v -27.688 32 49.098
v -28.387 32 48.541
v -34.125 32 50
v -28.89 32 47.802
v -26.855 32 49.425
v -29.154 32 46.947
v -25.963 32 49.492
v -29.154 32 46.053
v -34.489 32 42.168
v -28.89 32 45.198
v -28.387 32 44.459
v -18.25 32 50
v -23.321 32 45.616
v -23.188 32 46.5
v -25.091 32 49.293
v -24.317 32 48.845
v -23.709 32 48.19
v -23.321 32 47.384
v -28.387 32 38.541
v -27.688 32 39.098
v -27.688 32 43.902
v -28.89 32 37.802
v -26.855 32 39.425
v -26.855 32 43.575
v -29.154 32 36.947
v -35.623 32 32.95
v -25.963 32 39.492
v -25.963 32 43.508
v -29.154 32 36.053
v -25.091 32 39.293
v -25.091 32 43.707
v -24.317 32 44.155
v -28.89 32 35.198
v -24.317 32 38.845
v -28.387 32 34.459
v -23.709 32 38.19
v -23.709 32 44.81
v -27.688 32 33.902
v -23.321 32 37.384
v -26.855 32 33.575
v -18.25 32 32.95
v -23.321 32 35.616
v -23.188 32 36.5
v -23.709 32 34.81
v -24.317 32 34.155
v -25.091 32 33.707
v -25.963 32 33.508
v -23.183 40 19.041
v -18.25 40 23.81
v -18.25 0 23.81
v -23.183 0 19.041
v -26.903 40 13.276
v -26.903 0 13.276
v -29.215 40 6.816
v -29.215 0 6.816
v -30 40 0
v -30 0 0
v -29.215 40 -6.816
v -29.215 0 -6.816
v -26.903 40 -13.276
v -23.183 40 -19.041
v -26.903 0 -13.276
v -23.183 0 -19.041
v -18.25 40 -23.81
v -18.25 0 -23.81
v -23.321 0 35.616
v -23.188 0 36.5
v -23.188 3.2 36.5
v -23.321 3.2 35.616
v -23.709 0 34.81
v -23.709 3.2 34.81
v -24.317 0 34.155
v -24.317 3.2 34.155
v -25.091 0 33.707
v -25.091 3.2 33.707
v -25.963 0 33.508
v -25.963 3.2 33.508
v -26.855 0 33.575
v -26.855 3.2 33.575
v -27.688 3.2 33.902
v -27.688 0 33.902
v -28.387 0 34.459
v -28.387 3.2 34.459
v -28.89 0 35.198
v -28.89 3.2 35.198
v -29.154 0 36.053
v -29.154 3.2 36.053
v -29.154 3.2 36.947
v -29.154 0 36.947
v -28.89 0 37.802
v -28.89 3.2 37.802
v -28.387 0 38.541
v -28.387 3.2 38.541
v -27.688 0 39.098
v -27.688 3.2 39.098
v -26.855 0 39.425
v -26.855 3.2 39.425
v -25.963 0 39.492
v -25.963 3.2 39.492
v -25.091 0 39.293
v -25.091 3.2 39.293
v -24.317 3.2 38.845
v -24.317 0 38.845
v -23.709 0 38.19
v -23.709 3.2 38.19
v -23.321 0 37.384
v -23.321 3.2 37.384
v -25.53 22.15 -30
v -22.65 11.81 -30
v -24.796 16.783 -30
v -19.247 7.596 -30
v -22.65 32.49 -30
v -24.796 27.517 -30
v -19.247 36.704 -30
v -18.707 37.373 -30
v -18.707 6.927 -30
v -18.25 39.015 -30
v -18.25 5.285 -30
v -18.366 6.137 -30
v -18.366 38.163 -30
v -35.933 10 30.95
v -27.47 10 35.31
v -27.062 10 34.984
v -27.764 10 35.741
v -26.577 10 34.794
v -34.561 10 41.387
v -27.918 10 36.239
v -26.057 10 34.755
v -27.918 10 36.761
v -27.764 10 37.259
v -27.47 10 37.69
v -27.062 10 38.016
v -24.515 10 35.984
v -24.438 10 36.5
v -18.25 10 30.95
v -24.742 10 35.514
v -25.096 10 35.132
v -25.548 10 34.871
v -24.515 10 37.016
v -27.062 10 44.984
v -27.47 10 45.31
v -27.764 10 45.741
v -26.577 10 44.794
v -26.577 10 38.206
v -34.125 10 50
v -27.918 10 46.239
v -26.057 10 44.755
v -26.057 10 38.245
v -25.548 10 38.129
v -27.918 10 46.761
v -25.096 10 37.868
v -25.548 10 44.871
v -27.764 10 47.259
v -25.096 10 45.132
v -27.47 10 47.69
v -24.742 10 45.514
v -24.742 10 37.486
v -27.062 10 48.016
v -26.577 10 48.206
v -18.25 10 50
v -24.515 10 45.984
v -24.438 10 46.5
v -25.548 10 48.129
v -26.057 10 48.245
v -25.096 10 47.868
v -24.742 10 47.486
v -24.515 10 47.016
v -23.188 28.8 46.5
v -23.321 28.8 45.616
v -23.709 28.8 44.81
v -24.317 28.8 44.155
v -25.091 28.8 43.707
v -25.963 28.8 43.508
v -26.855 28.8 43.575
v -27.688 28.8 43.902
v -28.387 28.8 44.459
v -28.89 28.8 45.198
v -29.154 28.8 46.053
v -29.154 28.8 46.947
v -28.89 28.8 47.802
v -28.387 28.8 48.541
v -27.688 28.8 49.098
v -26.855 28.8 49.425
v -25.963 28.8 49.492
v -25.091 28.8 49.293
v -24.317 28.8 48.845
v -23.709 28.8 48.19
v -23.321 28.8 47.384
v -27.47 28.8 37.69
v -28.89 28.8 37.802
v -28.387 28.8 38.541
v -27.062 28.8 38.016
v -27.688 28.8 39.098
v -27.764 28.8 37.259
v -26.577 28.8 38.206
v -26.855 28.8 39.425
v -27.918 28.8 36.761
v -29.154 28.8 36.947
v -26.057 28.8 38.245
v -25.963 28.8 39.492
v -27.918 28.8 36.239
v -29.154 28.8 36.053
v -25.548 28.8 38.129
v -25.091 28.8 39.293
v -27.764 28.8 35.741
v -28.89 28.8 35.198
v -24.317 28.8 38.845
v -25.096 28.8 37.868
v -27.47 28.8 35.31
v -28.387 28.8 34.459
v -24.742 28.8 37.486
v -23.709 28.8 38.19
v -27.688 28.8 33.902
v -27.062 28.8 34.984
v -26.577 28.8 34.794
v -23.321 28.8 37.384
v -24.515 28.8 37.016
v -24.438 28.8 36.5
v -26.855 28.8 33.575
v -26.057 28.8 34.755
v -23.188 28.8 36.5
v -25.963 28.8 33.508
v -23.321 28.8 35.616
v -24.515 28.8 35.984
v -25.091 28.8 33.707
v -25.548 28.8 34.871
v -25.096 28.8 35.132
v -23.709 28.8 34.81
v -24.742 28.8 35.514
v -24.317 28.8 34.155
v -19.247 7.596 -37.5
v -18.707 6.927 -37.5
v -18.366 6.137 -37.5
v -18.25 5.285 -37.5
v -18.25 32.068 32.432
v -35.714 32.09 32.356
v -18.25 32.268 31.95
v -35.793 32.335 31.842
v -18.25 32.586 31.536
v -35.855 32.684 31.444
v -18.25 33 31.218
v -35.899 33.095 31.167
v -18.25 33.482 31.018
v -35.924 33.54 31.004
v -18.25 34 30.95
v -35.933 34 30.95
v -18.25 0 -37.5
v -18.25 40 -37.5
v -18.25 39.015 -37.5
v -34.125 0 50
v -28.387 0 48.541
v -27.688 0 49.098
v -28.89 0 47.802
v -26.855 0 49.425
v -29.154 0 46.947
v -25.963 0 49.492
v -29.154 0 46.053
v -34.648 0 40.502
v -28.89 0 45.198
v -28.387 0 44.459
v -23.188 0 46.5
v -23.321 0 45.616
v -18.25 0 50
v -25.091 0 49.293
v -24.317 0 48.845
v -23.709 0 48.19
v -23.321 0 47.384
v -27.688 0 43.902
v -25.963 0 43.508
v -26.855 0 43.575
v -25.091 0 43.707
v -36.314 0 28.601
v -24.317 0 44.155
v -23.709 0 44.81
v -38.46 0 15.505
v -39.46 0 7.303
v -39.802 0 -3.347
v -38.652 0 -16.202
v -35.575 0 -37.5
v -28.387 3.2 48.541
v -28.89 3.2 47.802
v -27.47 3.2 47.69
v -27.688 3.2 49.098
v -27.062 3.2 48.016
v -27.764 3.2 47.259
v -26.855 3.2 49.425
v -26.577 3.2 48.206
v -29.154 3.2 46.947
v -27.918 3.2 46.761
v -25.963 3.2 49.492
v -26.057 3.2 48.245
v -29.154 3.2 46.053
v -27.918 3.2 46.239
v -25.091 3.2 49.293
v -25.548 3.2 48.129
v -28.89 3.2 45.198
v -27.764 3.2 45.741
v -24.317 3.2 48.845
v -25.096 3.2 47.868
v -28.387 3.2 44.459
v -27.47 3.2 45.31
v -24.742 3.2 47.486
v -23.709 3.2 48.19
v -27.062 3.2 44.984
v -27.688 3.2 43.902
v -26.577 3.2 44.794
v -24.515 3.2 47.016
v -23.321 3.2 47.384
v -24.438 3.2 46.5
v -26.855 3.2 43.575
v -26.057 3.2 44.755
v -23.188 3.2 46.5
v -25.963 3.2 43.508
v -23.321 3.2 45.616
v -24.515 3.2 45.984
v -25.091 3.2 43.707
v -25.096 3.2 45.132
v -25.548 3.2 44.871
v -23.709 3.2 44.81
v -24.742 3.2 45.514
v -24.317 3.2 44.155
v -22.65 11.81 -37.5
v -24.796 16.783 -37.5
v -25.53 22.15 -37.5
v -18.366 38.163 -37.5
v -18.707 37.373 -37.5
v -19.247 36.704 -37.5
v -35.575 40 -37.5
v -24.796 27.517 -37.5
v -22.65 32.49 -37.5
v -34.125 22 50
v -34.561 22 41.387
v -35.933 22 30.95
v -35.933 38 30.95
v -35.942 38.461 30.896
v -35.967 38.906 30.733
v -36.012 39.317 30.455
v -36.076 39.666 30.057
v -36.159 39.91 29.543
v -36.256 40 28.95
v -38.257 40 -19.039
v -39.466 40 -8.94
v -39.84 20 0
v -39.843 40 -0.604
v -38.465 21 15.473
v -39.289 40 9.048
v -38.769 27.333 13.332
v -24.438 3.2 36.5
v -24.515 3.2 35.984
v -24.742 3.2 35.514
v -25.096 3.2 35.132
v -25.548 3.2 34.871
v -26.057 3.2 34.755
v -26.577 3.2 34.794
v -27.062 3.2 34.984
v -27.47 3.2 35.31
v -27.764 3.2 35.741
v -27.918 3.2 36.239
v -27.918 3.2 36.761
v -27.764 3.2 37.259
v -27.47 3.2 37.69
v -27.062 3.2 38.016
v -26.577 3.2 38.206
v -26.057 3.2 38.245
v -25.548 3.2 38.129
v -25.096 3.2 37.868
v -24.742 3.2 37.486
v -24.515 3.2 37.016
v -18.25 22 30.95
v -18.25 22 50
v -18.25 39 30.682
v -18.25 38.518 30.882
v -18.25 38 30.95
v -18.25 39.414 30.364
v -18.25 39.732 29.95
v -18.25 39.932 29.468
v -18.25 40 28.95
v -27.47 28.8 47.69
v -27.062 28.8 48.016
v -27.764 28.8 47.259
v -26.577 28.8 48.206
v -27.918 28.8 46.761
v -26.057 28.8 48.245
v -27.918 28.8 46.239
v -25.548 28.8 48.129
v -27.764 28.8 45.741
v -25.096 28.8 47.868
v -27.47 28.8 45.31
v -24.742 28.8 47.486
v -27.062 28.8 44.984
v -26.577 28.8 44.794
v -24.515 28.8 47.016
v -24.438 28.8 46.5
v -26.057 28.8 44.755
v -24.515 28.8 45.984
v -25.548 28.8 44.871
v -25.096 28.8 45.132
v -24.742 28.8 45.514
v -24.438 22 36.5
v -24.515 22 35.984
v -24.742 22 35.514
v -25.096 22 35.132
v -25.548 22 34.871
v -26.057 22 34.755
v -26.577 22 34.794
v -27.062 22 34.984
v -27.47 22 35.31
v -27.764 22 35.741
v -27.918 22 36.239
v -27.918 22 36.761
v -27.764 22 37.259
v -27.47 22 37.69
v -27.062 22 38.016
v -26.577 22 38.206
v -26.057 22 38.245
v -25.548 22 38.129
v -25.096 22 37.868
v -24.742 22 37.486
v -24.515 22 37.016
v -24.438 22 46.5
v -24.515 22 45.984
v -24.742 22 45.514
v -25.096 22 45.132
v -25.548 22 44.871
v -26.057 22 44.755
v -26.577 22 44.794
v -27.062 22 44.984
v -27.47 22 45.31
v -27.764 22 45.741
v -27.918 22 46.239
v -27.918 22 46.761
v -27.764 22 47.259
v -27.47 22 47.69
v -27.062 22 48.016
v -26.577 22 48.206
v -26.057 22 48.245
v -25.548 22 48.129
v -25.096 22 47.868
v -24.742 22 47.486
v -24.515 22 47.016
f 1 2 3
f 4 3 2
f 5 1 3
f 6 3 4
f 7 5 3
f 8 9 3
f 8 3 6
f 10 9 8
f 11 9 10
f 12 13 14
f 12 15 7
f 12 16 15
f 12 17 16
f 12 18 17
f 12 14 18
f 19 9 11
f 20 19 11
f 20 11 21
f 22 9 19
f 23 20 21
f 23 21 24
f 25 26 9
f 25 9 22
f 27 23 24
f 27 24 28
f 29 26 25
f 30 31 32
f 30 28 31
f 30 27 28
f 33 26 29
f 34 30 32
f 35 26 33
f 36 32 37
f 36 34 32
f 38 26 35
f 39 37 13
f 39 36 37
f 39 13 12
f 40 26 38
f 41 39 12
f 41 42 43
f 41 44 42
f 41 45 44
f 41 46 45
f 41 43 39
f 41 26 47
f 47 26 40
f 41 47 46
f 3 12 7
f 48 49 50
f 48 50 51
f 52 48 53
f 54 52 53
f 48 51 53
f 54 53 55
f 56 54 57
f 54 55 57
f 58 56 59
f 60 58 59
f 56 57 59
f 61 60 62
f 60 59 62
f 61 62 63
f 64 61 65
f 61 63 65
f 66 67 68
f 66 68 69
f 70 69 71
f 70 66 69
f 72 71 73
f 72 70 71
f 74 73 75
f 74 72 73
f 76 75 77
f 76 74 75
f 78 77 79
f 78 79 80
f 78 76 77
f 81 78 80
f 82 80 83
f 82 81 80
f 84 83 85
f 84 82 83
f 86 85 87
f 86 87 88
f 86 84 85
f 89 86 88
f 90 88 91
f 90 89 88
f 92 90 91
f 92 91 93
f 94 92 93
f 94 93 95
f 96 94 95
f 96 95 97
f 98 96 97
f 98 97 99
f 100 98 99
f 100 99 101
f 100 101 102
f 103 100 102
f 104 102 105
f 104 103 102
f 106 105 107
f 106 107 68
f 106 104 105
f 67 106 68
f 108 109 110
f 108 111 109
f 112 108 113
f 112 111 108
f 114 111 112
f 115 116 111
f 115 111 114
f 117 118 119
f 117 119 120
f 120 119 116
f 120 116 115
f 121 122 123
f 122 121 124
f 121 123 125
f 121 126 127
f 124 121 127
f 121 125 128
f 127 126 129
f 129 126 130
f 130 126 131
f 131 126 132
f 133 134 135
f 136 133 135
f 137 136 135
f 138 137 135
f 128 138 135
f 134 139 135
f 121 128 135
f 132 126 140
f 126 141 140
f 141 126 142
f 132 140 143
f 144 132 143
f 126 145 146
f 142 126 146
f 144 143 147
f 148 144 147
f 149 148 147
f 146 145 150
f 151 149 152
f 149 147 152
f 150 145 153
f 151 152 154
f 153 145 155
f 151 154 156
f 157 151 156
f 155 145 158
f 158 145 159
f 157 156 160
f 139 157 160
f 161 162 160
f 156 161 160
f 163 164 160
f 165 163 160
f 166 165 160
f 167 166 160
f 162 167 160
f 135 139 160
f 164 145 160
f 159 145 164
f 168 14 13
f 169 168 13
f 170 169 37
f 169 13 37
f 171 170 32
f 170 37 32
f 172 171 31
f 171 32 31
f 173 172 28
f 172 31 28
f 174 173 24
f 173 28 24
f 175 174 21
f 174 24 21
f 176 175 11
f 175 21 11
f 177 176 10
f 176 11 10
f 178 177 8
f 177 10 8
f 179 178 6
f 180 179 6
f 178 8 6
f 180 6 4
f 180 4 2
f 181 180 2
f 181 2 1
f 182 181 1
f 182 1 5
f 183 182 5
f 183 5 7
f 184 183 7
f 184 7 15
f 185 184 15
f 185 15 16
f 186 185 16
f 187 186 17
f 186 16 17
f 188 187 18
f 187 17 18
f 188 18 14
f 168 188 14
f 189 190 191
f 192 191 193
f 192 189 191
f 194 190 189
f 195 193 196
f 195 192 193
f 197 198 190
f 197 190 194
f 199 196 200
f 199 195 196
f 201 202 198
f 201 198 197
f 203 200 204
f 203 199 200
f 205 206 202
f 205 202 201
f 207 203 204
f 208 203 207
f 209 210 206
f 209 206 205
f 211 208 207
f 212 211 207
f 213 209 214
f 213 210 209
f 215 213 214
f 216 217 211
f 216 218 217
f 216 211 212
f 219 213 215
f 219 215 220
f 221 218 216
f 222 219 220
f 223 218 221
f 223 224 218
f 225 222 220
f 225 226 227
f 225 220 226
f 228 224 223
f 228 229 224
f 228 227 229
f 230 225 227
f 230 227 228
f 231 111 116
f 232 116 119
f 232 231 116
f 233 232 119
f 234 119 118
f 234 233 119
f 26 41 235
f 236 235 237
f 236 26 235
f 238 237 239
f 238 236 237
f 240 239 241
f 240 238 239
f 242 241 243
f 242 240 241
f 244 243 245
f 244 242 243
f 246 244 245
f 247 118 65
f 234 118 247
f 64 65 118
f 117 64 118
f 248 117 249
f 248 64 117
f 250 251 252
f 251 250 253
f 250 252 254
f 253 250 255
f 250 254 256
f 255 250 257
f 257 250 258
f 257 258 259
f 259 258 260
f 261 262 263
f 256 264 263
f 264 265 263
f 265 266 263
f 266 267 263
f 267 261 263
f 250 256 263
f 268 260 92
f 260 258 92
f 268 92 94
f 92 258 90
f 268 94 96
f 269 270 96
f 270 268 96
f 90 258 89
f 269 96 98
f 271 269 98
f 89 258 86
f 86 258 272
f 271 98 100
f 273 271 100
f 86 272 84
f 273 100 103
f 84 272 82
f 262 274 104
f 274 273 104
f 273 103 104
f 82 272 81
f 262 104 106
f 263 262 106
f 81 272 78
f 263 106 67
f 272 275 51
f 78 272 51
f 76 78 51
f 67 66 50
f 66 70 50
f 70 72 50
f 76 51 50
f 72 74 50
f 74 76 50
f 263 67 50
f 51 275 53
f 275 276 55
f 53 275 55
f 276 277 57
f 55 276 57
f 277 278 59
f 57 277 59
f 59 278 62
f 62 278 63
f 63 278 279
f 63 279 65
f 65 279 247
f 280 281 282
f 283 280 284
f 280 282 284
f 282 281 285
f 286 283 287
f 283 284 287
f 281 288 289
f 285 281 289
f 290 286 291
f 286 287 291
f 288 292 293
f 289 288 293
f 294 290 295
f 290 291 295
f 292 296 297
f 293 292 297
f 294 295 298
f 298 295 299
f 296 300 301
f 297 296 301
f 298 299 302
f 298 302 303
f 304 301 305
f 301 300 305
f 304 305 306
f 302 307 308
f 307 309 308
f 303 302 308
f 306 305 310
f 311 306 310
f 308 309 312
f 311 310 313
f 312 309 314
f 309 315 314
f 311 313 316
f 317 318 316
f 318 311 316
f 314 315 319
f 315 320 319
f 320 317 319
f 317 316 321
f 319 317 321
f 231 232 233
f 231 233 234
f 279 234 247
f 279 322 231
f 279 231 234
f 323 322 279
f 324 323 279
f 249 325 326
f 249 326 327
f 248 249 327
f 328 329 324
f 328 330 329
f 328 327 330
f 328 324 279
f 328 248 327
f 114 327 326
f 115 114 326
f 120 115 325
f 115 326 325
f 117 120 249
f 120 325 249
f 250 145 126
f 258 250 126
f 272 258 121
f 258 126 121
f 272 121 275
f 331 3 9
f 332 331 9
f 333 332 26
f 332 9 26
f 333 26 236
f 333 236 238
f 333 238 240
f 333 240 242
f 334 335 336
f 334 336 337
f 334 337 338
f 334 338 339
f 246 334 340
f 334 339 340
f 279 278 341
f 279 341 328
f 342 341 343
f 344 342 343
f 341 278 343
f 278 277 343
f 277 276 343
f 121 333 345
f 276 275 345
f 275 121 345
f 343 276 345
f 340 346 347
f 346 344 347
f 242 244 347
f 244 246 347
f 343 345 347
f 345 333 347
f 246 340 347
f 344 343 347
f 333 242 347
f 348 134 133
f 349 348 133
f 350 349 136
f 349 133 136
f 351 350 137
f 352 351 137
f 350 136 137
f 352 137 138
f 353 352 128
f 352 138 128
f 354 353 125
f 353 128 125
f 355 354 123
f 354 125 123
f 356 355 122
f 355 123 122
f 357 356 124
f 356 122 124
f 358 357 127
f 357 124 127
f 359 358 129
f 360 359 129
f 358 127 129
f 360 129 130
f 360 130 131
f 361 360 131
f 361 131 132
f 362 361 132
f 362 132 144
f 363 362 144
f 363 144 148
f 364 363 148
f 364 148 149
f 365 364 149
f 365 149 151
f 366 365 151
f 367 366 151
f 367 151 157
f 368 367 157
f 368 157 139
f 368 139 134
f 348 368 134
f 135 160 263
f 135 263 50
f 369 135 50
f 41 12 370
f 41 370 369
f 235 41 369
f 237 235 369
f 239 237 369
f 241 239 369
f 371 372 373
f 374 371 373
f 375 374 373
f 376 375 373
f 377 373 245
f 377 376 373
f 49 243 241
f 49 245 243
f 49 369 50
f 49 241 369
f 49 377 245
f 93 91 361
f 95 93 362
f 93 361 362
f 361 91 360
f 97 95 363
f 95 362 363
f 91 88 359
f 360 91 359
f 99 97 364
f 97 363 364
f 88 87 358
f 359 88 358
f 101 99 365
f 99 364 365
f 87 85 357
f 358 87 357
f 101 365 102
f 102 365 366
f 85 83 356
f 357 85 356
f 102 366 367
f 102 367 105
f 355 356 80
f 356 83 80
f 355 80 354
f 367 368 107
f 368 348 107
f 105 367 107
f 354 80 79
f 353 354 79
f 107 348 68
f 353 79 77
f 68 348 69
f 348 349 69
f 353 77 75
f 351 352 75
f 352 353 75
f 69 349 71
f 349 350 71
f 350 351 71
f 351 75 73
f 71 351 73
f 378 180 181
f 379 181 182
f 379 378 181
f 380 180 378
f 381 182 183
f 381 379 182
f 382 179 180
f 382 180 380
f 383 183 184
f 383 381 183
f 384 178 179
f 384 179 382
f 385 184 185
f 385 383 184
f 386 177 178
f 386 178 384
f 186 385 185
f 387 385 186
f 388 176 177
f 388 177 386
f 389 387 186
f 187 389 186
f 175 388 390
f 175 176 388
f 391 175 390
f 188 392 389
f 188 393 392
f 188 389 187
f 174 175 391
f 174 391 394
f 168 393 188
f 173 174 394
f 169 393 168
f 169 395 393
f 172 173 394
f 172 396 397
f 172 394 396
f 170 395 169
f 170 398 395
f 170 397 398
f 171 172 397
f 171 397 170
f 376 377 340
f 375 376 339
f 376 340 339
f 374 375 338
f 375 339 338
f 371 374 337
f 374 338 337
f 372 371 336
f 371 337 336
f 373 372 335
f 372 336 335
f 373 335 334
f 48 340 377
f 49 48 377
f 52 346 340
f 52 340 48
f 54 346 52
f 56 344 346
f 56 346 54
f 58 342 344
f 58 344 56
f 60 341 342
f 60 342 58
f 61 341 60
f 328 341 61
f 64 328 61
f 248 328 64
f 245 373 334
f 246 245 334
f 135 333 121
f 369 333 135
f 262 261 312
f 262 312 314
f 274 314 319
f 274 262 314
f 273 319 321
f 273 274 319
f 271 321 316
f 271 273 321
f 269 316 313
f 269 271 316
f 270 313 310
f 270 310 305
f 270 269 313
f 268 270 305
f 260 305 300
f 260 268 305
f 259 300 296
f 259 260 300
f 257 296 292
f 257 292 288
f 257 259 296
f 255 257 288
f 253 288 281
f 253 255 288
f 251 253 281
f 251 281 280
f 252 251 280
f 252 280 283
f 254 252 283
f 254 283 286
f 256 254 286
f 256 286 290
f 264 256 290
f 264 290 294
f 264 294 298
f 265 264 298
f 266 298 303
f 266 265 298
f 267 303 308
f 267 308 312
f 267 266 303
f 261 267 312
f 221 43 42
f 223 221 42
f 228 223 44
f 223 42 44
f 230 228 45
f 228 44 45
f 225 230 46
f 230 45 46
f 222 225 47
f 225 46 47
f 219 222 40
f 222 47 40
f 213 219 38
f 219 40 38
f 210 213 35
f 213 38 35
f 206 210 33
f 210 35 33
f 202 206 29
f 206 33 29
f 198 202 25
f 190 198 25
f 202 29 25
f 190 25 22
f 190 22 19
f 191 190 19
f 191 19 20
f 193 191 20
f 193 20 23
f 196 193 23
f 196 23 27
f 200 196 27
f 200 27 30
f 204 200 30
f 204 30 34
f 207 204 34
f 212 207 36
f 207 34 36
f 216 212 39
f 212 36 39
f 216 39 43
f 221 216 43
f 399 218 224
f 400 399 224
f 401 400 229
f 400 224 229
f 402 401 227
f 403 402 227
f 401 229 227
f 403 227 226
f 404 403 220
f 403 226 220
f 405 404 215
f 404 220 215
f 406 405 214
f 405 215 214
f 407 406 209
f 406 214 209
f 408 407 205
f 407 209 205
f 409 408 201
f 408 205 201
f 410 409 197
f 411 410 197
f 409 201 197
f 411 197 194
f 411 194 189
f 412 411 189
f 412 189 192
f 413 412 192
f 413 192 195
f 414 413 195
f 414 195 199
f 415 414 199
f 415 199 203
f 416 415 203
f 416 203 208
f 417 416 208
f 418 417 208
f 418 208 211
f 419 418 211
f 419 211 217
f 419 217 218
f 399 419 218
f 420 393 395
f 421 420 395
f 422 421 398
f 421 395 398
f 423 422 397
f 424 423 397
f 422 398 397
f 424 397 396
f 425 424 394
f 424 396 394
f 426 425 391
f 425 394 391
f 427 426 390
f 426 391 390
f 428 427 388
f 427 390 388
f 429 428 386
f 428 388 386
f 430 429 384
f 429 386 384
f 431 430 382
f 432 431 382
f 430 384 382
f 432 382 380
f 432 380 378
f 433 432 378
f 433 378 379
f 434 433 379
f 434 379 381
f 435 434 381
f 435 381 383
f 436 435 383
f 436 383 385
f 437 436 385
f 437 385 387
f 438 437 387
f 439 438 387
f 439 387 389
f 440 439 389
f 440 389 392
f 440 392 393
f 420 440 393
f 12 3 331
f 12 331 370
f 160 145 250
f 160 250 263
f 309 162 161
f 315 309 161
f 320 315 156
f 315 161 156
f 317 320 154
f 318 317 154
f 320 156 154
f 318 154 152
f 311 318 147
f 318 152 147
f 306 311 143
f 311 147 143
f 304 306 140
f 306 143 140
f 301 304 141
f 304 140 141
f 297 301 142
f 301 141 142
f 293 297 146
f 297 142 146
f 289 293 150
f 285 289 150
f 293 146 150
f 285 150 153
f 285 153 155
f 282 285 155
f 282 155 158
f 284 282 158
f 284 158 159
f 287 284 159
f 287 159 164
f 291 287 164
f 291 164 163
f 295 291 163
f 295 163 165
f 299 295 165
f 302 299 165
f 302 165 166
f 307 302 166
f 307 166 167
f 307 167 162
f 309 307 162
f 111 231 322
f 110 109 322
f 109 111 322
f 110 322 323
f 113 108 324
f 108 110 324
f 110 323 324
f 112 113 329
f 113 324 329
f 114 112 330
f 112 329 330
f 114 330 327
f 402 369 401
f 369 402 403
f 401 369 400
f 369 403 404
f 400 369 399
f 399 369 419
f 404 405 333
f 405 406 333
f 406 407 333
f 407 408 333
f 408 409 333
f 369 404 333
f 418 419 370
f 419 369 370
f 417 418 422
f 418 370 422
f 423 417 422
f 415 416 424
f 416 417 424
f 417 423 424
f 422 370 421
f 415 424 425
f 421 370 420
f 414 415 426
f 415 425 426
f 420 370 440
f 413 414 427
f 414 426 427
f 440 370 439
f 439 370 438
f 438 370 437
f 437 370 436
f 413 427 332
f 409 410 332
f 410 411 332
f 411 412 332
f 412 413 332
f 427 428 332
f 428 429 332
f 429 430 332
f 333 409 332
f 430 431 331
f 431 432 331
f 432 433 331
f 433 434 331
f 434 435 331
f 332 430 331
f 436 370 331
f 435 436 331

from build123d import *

# Parameters (mm, degrees)
BOSS_EXTRUDE1_DEPTH = 40
SKETCH3_W           = 12.7
SKETCH3_H           = 40
BOSS_EXTRUDE2_DEPTH = 27.178
SKETCH4_W           = 184.978795618
SKETCH4_H           = 131.733859804
CUT_EXTRUDE2_DEPTH  = 51
SKETCH5_W           = 144.166334374
SKETCH5_H           = 140.012963834
CUT_EXTRUDE3_DEPTH  = 18.25
SKETCH6_R           = 20
CUT_EXTRUDE4_DEPTH  = 20
FILLET4_R           = 3.175
SKETCH7_W           = 96.652193462
SKETCH7_H           = 93.586405028
CUT_EXTRUDE5_DEPTH  = 27.178
CUT_EXTRUDE6_DEPTH  = 41
CUT_EXTRUDE7_DEPTH  = 8
FILLET5_R           = 2
SKETCH10_R          = 1.75
CUT_EXTRUDE8_DEPTH  = 33.0000001
SKETCH11_W          = 9.551786503
SKETCH11_H          = 12
SKETCH11_W_2        = 7.9375
CUT_EXTRUDE9_DEPTH  = 19.05
SKETCH14_R          = 3
CUT_EXTRUDE10_DEPTH = 3.2
SKETCH15_W          = 61.098487026
SKETCH15_H          = 49.743772834
CUT_EXTRUDE11_DEPTH = 12.5


with BuildPart() as part:
    # Sketch1 → Boss-Extrude1 (new body)
    with BuildSketch(Plane(origin=(0, 0, 0), x_dir=(1, 0, 0), z_dir=(0, 1, 0))):
        with BuildLine():
            Line((-50, -50), (0, -50))
            Line((0, -50), (0, -30))
            ThreePointArc((0, -30), (-30, 0), (0, 30))
            Line((0, 30), (0, 50))
            Line((0, 50), (-50, 50))
            Line((-50, 50), (-50, -50))
        make_face()
        with BuildLine():
            Line((0, -30), (0, -50))
            Line((0, -50), (50, -50))
            Line((50, -50), (50, 50))
            Line((50, 50), (0, 50))
            Line((0, 50), (0, 30))
            ThreePointArc((0, 30), (21.213203436, 21.213203436), (30, 0))
            ThreePointArc((30, 0), (21.213203436, -21.213203436), (0, -30))
        make_face()
    extrude(amount=BOSS_EXTRUDE1_DEPTH)

    # Sketch3 → Boss-Extrude2 (add)
    with BuildSketch(Plane.XY.offset(50)):
        with Locations((-24.6, 20)):
            Rectangle(SKETCH3_W, SKETCH3_H)
    extrude(amount=BOSS_EXTRUDE2_DEPTH)

    # Sketch4 → Cut-Extrude2 (cut, through all)
    with BuildSketch(Plane(origin=(0, 0, 0), x_dir=(0, 0, -1), z_dir=(1, 0, 0))):
        Rectangle(SKETCH4_W, SKETCH4_H)
    extrude(amount=CUT_EXTRUDE2_DEPTH, mode=Mode.SUBTRACT)

    # Sketch5 → Cut-Extrude3 (cut)
    with BuildSketch(Plane(origin=(0, 0, 0), x_dir=(0, 0, -1), z_dir=(1, 0, 0))):
        Rectangle(SKETCH5_W, SKETCH5_H)
    extrude(amount=-CUT_EXTRUDE3_DEPTH, mode=Mode.SUBTRACT)

    # Sketch6 → Cut-Extrude4 (cut)
    with BuildSketch(Plane(origin=(0, 0, -50), x_dir=(-1, 0, 0), z_dir=(0, 0, -1))):
        with Locations((5.529693955, 22.14995336)):
            Circle(SKETCH6_R)
    extrude(amount=-CUT_EXTRUDE4_DEPTH, mode=Mode.SUBTRACT)

    # Fillet4
    fillet4_edges = [part.edges().sort_by_distance(p)[0] for p in [
        (-18.25, 6.716424466, -40),
        (-18.25, 37.583482255, -40),
    ]]
    fillet(fillet4_edges, radius=FILLET4_R)

    # Sketch7 → Cut-Extrude5 (cut)
    with BuildSketch(Plane.XY.offset(77.178)):
        Rectangle(SKETCH7_W, SKETCH7_H)
    extrude(amount=-CUT_EXTRUDE5_DEPTH, mode=Mode.SUBTRACT)

    # Sketch8 → Cut-Extrude6 (cut, through all)
    with BuildSketch(Plane(origin=(0, 40, 0), x_dir=(1, 0, 0), z_dir=(0, 1, 0))):
        with BuildLine():
            Line((-34.76, 50), (-50, 50))
            Line((-50, 50), (-50, -50))
            Line((-50, -50), (-34.125, -50))
            add(Edge.make_bspline(
                [(-34.125, -50), (-34.125, -33.241229213), (-45.237036485, -0.093705418), (-34.76, 33.330216103), (-34.76, 50)],
                knots=[0, 0, 0, 0, 0.500369617, 1, 1, 1, 1], degree=3))
        make_face()
    extrude(amount=-CUT_EXTRUDE6_DEPTH, mode=Mode.SUBTRACT)

    # Sketch9 → Cut-Extrude7 (cut)
    with BuildSketch(Plane(origin=(0, 40, 0), x_dir=(1, 0, 0), z_dir=(0, 1, 0))):
        with BuildLine():
            Line((-18.25, -50), (-18.25, -30.95))
            Line((-18.25, -30.95), (-35.932995014, -30.95))
            add(Edge.make_bspline(
                [(-34.125, -50), (-34.125, -43.629466822), (-34.928437006, -37.283896996), (-35.932995014, -30.95)],
                knots=[0, 0, 0, 0, 0.190206149, 0.190206149, 0.190206149, 0.190206149], degree=3))
            Line((-34.125, -50), (-18.25, -50))
        make_face()
    extrude(amount=-CUT_EXTRUDE7_DEPTH, mode=Mode.SUBTRACT)

    # Fillet5
    fillet5_edges = [part.edges().sort_by_distance(p)[0] for p in [
        (-27.091497507, 32, 30.95),
        (-27.091497507, 40, 30.95),
    ]]
    fillet(fillet5_edges, radius=FILLET5_R)

    # Sketch10 → Cut-Extrude8 (cut, through all)
    with BuildSketch(Plane(origin=(0, 32, 0), x_dir=(1, 0, 0), z_dir=(0, 1, 0))):
        with Locations((-26.1875, -46.5)):
            Circle(SKETCH10_R)
        with Locations((-26.1875, -36.5)):
            Circle(SKETCH10_R)
    extrude(amount=-CUT_EXTRUDE8_DEPTH, mode=Mode.SUBTRACT)

    # Sketch11 → Cut-Extrude9 (cut)
    with BuildSketch(Plane.XY.offset(50)):
        with Locations((-38.900893252, 16)):
            Rectangle(SKETCH11_W, SKETCH11_H)
        with Locations((-30.15625, 16)):
            Rectangle(SKETCH11_W_2, SKETCH11_H)
        with Locations((-22.21875, 16)):
            Rectangle(SKETCH11_W_2, SKETCH11_H)
    extrude(amount=-CUT_EXTRUDE9_DEPTH, mode=Mode.SUBTRACT)

    # Sketch14 → Cut-Extrude10 (cut)
    with BuildSketch(Plane(origin=(0, 32, 0), x_dir=(1, 0, 0), z_dir=(0, 1, 0))):
        with Locations((-26.1875, -36.5)):
            Circle(SKETCH14_R)
        with Locations((-26.1875, -46.5)):
            Circle(SKETCH14_R)
    cut_extrude10 = extrude(amount=-CUT_EXTRUDE10_DEPTH, mode=Mode.SUBTRACT)

    # Mirror2: Cut-Extrude10 across plane
    add(cut_extrude10.mirror(Plane.ZX.offset(16)), mode=Mode.SUBTRACT)

    # Sketch15 → Cut-Extrude11 (cut)
    with BuildSketch(Plane(origin=(0, 0, -50), x_dir=(-1, 0, 0), z_dir=(0, 0, -1))):
        with Locations((30.549243513, 24.871886417)):
            Rectangle(SKETCH15_W, SKETCH15_H)
    extrude(amount=-CUT_EXTRUDE11_DEPTH, mode=Mode.SUBTRACT)


solid = part.part
